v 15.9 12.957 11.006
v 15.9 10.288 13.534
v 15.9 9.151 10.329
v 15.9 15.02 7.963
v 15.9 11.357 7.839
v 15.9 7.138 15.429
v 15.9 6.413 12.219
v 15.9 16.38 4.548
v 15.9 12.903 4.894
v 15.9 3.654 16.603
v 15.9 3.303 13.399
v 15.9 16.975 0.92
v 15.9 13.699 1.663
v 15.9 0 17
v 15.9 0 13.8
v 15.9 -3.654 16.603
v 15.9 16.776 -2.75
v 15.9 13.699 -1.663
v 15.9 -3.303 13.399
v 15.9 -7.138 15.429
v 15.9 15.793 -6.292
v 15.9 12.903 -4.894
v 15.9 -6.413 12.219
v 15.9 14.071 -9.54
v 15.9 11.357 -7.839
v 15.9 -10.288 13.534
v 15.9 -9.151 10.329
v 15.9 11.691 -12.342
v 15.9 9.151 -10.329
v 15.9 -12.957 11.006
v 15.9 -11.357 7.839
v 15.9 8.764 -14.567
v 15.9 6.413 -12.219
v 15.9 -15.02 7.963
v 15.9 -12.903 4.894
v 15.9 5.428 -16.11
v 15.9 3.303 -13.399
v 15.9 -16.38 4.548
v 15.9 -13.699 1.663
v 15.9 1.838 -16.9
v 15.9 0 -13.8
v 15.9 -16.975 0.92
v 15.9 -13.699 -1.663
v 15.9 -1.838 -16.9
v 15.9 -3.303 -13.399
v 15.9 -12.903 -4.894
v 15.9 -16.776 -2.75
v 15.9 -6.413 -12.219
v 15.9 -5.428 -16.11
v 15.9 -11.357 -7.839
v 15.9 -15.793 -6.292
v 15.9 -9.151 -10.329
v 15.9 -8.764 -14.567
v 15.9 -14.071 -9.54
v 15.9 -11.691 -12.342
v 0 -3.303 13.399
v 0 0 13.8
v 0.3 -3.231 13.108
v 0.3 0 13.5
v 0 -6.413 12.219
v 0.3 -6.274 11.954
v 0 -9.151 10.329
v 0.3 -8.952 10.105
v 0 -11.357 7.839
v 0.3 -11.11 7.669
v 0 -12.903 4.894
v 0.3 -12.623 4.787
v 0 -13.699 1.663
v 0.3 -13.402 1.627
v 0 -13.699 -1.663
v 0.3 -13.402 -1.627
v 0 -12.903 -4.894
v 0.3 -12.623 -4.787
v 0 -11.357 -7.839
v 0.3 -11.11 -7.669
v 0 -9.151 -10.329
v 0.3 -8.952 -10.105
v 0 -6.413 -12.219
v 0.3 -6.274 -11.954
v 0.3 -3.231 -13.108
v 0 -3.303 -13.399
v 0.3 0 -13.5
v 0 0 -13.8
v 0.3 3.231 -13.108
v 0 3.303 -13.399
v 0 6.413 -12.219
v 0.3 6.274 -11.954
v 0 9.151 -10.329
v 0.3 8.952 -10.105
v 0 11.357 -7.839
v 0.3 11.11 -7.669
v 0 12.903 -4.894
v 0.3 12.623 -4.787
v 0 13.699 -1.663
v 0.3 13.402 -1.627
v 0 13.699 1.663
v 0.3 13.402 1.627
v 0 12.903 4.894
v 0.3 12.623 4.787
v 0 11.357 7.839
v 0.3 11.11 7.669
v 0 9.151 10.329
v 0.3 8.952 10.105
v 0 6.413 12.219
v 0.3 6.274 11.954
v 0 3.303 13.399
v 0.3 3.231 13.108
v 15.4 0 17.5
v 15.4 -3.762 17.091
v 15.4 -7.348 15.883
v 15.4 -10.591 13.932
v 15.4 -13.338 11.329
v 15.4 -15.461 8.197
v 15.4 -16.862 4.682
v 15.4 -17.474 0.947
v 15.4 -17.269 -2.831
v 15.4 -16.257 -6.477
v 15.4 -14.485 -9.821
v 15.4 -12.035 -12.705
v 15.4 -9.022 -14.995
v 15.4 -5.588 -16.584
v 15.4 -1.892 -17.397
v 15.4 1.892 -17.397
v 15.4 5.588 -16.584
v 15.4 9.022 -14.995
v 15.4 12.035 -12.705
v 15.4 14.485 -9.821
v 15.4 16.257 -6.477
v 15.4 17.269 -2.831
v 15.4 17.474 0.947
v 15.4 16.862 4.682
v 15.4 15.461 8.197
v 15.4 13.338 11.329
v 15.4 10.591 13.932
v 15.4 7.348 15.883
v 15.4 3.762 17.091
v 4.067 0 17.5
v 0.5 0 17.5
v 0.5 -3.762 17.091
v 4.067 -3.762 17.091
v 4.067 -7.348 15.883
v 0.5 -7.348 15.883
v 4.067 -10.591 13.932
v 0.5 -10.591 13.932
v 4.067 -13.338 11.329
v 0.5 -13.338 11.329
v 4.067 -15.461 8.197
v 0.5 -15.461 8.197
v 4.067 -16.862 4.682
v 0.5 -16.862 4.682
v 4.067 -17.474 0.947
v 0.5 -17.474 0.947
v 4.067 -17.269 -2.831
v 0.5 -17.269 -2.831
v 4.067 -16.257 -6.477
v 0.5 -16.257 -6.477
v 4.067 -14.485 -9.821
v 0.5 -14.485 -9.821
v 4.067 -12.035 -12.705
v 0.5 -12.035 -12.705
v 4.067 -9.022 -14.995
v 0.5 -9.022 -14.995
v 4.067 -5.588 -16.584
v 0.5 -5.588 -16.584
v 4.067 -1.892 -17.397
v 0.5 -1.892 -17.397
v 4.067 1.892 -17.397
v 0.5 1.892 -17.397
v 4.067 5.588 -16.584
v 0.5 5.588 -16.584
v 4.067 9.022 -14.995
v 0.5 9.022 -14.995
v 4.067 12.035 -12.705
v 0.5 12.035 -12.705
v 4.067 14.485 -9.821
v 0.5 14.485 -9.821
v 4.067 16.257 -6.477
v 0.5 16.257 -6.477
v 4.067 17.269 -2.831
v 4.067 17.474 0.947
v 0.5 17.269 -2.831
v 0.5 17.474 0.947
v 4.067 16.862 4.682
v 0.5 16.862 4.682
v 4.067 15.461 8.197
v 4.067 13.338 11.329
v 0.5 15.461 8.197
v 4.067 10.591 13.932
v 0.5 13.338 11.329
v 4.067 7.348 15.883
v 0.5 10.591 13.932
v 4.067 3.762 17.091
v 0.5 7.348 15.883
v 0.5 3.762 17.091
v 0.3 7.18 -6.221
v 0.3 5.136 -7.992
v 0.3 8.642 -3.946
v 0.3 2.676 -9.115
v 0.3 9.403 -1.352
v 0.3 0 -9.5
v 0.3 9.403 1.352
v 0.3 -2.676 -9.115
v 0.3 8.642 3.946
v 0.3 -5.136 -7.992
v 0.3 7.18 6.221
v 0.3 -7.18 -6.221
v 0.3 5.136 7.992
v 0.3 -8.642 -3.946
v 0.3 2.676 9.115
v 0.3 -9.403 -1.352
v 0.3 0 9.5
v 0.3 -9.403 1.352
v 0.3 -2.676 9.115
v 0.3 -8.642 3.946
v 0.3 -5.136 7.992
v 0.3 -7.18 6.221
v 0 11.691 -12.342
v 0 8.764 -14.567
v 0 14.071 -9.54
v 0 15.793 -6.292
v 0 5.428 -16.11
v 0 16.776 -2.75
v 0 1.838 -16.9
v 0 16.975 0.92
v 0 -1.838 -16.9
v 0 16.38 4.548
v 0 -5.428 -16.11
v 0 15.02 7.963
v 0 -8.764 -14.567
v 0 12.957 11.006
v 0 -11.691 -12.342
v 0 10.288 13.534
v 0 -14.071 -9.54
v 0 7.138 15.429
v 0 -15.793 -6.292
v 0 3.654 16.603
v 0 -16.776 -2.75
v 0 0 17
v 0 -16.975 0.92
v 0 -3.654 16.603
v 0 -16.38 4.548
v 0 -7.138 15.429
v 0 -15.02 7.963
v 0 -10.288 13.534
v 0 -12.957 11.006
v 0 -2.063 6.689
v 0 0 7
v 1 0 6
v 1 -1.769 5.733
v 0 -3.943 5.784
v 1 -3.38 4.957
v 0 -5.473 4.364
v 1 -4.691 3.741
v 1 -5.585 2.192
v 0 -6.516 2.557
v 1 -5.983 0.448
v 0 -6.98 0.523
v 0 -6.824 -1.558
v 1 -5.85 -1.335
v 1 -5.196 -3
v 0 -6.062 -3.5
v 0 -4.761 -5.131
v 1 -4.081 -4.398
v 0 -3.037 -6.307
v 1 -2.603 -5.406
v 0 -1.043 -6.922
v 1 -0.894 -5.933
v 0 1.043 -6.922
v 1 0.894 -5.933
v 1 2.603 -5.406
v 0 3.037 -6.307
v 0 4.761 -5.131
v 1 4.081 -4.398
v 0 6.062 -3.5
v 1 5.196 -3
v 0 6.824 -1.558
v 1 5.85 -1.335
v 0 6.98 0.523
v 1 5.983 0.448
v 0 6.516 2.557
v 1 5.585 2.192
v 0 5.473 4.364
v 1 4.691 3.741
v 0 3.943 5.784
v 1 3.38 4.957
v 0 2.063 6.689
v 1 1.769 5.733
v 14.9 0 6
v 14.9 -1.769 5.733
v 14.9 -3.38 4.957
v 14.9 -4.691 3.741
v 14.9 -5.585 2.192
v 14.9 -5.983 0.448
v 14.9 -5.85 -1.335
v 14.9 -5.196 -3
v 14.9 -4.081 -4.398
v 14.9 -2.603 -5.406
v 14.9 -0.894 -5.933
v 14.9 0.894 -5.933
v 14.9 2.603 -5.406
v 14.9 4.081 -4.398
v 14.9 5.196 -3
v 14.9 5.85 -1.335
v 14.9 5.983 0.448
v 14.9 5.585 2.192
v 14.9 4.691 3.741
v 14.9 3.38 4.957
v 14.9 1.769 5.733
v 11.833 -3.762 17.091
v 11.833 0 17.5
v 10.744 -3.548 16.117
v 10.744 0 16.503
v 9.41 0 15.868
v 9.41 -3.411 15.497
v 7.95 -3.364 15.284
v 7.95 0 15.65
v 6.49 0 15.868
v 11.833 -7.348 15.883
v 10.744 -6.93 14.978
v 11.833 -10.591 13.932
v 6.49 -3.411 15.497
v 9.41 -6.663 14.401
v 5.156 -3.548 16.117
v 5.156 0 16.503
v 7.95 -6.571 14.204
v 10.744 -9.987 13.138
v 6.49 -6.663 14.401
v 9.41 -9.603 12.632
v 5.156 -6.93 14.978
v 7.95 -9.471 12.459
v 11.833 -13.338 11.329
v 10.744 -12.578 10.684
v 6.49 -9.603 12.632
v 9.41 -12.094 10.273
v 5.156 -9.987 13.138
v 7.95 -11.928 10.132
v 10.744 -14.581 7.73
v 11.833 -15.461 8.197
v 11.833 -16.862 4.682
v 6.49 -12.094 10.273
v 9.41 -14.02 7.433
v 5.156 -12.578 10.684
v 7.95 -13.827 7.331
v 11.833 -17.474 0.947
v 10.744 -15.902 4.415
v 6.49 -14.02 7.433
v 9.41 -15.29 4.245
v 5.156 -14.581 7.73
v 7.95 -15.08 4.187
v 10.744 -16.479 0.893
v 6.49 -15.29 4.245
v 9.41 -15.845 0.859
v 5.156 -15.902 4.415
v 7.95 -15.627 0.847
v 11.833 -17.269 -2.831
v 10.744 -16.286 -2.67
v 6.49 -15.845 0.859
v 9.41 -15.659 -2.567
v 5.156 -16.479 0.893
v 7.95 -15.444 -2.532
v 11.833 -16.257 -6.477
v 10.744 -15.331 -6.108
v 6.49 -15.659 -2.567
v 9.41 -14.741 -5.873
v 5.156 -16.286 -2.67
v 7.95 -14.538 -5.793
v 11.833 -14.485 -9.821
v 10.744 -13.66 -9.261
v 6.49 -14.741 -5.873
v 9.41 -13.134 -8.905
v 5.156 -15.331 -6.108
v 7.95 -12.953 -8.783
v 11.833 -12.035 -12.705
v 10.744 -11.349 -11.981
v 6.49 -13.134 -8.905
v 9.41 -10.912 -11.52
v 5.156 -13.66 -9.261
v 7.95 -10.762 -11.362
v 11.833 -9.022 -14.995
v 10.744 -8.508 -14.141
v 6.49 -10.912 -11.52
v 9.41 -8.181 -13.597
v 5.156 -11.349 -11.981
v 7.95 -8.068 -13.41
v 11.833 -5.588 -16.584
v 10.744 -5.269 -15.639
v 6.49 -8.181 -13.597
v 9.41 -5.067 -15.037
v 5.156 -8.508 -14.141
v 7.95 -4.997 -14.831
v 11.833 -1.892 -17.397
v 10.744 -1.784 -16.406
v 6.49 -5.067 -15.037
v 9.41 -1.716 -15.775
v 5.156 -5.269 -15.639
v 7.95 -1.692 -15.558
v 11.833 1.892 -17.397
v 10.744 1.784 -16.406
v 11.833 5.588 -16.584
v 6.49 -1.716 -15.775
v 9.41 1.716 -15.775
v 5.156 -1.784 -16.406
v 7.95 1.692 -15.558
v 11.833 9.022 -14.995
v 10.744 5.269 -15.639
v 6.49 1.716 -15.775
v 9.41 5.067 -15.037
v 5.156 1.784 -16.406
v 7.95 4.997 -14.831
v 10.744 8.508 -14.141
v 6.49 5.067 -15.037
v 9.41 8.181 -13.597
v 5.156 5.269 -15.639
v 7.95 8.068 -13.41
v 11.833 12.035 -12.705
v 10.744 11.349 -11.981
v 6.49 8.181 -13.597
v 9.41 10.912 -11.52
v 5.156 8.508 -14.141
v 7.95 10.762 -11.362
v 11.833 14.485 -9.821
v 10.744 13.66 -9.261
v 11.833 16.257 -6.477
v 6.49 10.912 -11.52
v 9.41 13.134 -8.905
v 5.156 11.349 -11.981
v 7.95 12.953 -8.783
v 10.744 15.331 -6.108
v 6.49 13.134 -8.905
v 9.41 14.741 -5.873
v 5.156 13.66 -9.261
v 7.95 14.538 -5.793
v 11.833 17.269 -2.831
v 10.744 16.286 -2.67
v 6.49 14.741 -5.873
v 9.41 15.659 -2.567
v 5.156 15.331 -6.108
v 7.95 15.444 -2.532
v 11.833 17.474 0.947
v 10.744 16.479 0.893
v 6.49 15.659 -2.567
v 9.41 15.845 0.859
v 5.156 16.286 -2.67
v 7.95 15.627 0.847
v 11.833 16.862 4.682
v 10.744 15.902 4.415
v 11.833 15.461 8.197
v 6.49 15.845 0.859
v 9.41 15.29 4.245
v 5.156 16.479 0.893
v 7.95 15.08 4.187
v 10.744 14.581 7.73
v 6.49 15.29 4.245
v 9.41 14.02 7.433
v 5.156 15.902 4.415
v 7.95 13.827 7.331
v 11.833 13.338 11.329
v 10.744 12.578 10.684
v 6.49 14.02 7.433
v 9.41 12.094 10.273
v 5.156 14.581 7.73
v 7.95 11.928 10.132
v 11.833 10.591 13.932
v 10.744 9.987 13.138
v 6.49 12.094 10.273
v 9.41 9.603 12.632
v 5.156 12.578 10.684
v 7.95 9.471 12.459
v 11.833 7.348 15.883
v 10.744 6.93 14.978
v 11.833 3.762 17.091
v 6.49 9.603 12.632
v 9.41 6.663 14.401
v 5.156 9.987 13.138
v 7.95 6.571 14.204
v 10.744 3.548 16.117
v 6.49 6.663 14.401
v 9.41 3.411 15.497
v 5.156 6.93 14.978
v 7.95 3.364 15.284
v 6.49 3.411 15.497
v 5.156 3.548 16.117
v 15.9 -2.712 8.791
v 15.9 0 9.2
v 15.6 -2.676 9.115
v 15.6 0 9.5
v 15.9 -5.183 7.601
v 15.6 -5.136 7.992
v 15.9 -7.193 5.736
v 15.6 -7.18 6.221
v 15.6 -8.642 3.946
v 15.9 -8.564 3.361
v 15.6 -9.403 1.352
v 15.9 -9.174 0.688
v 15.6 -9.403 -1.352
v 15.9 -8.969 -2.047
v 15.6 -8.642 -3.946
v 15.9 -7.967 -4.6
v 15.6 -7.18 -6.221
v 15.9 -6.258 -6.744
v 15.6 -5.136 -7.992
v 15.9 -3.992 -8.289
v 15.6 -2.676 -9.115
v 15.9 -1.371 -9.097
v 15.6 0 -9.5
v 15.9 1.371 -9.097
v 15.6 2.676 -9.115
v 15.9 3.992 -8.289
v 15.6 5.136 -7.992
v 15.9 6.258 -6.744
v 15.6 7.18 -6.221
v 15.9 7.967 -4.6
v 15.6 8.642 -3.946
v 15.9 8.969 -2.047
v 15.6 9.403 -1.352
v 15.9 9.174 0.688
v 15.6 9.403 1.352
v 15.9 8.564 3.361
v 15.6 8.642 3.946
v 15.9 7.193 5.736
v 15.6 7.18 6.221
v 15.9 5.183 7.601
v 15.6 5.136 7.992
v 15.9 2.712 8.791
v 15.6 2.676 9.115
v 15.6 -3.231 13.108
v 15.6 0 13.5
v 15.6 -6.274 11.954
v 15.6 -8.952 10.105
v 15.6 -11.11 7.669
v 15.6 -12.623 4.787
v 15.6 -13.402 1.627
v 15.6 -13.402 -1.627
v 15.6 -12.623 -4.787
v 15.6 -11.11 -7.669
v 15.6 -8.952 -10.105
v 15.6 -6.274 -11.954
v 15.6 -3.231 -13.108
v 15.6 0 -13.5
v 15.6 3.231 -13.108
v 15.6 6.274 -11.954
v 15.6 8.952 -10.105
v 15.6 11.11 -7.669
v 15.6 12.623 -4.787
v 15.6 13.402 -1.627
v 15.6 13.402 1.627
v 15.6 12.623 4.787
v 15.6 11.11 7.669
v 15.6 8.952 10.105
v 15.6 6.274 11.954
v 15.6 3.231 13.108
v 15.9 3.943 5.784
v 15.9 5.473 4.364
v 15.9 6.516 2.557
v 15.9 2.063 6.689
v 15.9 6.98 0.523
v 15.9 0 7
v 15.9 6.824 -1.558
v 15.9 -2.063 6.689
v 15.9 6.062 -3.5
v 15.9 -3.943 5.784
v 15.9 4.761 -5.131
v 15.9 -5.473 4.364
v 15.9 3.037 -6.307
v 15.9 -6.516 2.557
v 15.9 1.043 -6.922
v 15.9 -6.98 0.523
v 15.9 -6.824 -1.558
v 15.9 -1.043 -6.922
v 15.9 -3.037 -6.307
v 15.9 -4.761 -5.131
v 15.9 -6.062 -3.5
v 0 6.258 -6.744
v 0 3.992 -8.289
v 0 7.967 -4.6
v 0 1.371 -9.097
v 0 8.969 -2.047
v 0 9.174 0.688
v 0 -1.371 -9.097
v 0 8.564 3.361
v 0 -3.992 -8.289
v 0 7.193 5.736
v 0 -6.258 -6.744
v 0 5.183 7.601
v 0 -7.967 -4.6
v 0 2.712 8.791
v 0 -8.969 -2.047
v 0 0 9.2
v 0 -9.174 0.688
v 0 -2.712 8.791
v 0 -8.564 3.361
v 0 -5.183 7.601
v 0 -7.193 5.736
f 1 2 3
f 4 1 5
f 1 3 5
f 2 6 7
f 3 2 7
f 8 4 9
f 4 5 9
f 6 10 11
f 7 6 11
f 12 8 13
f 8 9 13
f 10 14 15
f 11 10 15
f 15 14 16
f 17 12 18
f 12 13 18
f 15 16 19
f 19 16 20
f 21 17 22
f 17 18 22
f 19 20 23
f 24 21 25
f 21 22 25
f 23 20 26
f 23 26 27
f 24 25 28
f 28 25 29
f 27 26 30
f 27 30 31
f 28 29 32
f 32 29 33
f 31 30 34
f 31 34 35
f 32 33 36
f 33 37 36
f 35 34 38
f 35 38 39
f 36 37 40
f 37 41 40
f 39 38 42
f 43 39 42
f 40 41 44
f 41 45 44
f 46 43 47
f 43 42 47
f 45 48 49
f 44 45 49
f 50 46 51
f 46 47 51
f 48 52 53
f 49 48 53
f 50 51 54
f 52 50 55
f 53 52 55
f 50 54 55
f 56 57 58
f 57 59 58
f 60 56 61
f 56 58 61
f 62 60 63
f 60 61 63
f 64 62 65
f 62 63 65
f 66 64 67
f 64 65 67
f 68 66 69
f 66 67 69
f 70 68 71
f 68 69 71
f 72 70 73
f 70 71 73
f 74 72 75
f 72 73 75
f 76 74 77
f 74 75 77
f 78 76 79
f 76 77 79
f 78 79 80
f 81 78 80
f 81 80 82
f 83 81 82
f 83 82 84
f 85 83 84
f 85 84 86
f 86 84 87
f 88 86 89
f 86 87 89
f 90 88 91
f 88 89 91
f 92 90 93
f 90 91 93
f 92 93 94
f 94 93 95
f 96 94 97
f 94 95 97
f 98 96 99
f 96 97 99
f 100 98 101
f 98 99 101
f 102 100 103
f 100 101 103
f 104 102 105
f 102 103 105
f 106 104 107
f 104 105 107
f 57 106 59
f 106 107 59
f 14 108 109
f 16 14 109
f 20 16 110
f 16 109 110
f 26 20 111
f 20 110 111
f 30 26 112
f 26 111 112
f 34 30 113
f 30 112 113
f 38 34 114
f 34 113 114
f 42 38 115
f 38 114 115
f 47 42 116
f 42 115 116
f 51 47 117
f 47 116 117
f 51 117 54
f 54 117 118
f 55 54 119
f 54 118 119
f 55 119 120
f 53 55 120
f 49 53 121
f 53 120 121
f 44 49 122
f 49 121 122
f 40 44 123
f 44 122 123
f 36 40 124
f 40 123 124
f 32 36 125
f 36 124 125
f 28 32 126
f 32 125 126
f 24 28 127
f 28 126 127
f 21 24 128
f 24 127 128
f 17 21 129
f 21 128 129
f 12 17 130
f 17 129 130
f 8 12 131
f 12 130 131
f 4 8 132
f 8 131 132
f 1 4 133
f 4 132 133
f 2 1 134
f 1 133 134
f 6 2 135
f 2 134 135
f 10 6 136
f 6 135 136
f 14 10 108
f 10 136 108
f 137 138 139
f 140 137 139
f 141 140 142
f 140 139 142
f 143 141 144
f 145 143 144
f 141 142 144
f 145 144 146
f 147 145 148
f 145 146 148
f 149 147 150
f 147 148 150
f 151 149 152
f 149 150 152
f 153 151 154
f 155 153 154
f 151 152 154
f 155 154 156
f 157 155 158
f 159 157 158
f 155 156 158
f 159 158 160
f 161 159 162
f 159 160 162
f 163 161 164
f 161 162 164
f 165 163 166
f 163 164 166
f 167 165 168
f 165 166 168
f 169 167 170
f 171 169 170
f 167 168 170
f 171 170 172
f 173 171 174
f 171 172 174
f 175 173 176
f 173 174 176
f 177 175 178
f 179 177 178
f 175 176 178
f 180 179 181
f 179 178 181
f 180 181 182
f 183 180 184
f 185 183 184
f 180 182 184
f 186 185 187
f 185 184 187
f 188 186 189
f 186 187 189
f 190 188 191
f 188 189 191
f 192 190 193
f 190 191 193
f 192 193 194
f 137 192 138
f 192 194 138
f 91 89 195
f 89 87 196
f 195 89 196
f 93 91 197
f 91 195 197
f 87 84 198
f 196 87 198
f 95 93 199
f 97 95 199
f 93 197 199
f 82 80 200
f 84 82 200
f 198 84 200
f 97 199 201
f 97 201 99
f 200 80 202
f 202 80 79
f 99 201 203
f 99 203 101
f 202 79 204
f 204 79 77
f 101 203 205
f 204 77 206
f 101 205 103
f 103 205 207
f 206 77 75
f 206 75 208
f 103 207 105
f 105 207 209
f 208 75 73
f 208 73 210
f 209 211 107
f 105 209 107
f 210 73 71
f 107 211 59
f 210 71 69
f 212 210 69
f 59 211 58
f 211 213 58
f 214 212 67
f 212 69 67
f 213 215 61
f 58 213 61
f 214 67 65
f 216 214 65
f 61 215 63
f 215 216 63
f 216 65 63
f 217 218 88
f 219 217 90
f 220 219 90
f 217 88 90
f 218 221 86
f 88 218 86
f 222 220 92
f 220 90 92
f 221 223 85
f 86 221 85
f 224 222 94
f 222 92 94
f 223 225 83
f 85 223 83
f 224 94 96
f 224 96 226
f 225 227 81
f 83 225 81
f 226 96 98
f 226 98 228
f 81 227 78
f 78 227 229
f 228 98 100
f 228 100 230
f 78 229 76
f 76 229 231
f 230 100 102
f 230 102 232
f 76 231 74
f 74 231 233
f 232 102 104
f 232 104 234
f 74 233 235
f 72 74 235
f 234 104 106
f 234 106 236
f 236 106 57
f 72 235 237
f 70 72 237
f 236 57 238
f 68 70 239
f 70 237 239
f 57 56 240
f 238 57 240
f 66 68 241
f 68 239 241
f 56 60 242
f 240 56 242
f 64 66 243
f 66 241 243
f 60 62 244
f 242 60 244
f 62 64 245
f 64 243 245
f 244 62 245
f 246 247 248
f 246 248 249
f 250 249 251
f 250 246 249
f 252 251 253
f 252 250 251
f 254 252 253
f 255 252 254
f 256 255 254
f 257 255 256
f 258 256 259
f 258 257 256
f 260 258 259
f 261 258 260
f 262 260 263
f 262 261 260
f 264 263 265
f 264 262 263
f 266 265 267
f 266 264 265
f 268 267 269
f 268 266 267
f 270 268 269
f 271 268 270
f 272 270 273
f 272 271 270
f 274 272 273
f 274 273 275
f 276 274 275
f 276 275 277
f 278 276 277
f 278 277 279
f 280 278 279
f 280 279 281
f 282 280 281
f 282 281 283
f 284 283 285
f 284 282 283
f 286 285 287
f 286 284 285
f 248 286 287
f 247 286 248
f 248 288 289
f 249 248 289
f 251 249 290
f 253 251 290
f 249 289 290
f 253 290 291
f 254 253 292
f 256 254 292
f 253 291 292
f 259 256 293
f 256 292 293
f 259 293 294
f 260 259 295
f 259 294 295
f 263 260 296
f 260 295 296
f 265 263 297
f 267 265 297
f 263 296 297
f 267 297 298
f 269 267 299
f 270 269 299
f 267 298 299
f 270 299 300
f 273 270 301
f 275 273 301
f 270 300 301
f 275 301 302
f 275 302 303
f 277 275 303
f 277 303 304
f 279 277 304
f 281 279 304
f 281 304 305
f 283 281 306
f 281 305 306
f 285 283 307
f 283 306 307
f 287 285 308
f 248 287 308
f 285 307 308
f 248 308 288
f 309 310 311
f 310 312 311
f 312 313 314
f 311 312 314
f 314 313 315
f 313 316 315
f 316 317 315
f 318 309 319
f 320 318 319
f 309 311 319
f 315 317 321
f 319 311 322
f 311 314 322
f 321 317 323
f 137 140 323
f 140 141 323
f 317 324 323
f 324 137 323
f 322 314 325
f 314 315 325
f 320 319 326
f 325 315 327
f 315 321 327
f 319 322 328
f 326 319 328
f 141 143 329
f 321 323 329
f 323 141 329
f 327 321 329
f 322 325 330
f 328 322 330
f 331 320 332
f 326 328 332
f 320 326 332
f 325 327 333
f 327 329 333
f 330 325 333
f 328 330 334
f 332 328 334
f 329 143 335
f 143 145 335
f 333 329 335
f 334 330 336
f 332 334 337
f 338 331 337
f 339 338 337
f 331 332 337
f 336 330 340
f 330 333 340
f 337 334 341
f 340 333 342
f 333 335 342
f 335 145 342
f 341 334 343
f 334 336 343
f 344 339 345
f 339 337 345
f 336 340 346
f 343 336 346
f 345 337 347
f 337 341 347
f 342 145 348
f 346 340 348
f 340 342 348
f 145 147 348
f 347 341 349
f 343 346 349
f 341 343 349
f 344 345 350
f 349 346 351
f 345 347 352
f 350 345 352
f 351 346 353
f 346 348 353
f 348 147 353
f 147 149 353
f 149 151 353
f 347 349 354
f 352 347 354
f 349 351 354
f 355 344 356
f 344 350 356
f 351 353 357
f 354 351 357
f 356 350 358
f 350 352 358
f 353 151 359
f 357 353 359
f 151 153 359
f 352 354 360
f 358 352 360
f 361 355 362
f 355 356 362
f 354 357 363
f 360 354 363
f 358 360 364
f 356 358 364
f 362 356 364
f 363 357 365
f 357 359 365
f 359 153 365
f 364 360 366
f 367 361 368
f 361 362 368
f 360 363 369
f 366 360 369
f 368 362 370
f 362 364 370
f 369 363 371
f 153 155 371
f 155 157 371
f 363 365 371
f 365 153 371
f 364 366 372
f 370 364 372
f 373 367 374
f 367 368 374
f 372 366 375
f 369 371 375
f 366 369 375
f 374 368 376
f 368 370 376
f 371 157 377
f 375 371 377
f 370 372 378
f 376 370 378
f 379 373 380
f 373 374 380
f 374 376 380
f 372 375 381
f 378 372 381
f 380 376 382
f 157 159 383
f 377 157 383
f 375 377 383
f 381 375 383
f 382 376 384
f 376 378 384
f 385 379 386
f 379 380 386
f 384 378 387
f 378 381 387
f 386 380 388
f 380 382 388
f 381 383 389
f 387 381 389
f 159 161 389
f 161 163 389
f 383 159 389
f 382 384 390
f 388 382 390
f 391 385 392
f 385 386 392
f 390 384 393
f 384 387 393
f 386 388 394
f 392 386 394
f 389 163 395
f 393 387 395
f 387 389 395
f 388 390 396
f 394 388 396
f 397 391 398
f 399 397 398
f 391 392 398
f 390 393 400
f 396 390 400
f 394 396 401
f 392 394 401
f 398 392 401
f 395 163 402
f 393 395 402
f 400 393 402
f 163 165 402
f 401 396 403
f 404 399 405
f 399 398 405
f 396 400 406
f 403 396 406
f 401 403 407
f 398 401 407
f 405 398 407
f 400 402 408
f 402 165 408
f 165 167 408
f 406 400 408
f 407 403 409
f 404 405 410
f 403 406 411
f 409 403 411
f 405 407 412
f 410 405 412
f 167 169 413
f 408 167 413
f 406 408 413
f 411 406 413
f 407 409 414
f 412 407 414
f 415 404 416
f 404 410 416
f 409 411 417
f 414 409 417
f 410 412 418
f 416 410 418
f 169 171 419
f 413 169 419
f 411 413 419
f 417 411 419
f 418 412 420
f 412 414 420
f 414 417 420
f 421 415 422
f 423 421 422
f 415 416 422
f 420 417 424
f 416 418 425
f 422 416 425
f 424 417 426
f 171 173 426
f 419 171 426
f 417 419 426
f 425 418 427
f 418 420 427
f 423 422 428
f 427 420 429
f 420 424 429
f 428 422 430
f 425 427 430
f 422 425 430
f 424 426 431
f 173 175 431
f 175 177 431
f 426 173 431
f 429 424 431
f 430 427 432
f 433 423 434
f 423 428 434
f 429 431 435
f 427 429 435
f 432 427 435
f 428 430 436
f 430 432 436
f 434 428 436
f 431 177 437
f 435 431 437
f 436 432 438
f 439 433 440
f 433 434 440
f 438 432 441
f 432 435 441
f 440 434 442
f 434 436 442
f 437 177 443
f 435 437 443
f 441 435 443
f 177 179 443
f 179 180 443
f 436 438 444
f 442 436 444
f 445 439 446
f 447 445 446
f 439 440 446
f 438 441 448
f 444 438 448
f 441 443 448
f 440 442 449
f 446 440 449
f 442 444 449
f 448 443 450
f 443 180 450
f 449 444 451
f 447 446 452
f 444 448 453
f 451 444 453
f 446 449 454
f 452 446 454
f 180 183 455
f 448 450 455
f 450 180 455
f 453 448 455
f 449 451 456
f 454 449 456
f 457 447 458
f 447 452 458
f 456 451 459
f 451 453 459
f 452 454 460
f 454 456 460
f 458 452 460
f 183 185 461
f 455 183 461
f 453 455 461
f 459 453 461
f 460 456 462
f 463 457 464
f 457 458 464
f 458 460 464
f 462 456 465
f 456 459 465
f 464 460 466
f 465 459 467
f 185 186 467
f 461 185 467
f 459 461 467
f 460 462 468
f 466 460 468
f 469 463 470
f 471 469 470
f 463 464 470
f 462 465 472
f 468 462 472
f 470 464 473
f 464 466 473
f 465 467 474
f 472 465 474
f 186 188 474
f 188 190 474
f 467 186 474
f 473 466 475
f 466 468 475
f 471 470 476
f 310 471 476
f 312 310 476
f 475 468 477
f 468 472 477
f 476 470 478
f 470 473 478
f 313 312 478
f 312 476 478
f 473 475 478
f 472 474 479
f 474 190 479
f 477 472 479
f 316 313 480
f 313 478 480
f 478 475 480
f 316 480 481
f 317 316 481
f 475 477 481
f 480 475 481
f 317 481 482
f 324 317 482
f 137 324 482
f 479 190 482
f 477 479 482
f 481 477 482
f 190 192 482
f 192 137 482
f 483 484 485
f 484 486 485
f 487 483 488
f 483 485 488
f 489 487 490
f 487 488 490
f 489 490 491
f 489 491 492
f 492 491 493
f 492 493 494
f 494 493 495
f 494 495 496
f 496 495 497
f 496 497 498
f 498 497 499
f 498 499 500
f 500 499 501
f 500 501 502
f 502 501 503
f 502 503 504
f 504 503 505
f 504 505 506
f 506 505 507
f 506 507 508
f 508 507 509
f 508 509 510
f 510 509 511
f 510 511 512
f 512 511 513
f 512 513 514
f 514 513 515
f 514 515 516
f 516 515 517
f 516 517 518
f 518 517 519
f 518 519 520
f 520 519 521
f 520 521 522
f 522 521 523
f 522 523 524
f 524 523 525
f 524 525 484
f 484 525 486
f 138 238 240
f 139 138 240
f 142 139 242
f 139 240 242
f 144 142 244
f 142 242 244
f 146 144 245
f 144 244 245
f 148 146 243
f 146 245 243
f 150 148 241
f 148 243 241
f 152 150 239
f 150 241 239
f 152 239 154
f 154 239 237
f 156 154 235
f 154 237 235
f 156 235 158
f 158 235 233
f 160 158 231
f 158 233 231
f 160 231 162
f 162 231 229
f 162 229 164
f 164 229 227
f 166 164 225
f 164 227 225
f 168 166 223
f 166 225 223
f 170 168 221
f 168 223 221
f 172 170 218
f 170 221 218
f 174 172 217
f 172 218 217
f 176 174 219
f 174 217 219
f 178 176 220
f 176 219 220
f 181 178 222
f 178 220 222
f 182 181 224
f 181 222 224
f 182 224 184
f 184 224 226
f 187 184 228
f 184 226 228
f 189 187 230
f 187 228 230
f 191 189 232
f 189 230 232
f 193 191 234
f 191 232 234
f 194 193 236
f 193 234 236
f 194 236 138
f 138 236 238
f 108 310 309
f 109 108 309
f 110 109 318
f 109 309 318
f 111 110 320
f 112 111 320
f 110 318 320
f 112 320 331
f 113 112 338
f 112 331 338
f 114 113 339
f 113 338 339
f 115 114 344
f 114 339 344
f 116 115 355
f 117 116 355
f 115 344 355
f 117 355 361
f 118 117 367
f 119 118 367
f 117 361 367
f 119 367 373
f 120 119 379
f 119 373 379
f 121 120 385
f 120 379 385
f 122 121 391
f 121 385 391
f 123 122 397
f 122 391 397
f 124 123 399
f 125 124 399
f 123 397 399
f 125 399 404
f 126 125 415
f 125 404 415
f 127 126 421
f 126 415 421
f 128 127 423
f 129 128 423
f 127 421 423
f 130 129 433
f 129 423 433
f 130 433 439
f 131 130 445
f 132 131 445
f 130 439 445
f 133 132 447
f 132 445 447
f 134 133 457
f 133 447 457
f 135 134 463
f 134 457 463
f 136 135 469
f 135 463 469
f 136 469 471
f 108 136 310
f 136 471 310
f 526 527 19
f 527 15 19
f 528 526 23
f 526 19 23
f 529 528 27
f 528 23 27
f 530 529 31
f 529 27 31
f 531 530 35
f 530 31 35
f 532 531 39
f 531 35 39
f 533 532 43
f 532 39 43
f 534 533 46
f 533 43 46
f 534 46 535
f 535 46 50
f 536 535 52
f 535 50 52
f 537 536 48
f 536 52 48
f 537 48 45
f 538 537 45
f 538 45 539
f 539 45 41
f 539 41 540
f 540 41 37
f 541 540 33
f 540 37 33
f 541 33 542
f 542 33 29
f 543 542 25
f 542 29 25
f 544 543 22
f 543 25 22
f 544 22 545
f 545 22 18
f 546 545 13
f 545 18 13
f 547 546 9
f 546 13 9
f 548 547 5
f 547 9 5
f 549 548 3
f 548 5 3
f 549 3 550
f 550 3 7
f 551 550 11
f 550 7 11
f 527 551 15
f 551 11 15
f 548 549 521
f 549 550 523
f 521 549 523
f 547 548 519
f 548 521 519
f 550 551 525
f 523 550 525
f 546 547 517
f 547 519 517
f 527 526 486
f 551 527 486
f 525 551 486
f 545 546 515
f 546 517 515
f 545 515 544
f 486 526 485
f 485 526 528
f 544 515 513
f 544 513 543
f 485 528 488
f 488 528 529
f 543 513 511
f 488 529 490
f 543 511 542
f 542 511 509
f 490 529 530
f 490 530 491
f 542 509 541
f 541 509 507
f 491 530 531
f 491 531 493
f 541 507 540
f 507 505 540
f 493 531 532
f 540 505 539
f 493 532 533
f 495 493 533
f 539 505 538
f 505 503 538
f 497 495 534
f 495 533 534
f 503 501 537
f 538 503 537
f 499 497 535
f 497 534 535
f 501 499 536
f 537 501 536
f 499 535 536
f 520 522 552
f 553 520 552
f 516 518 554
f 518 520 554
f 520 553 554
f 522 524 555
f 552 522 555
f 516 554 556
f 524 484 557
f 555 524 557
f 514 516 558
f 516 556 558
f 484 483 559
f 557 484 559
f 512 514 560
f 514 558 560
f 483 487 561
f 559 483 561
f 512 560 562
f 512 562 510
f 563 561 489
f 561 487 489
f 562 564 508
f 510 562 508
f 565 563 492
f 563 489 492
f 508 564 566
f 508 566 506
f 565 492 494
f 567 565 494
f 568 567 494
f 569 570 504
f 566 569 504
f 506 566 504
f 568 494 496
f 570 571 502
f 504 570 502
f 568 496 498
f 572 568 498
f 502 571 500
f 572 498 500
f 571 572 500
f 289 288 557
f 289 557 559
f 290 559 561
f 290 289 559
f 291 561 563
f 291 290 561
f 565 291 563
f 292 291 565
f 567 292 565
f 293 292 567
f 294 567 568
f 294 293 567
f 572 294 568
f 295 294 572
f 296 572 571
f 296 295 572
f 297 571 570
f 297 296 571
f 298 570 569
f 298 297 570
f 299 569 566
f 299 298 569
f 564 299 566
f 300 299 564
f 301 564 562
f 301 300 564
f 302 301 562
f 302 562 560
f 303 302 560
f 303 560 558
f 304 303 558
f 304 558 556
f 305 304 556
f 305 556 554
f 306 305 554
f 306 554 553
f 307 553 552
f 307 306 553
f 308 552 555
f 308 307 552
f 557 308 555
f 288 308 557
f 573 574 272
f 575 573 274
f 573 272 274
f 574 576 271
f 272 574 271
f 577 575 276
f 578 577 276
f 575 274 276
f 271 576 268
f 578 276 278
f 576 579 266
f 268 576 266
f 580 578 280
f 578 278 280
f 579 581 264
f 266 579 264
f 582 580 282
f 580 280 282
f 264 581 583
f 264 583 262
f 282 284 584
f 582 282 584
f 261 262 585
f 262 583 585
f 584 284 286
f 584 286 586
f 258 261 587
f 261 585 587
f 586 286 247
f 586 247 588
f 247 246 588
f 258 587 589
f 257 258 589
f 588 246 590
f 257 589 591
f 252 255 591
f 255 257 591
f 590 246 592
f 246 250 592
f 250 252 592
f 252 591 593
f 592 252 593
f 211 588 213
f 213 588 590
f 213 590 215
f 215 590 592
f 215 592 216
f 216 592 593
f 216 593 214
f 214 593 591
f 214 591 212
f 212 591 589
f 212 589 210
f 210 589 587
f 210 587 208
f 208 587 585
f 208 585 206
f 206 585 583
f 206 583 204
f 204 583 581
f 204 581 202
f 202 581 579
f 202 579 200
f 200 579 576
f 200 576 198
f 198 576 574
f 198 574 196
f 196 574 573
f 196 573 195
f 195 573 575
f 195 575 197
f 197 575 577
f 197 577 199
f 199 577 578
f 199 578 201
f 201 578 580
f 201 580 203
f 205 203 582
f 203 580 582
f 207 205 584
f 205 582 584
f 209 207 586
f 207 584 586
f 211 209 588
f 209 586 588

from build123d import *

# Parameters (mm, degrees)
F2_SIZE = 0.5
F3_SIZE = 1


with BuildPart() as f1:
    # F0 (on Front) → F1 (revolve)
    with BuildSketch(Plane.XZ):
        with BuildLine():
            Line((0, 9.2), (0, 6))
            Line((0, 6), (15.9, 6))
            Line((15.9, 6), (15.9, 9.2))
            Line((15.9, 9.2), (15.6, 9.5))
            Line((15.6, 9.5), (15.6, 13.5))
            Line((15.6, 13.5), (15.9, 13.8))
            Line((15.9, 13.8), (15.9, 17.5))
            Line((15.9, 17.5), (11.832976, 17.5))
            ThreePointArc((11.832976, 17.5), (7.95, 15.65), (4.067024, 17.5))
            Line((4.067024, 17.5), (0, 17.5))
            Line((0, 17.5), (0, 13.8))
            Line((0, 13.8), (0.3, 13.5))
            Line((0.3, 13.5), (0.3, 9.5))
            Line((0.3, 9.5), (0, 9.2))
        make_face()
    revolve(axis=Axis((29.48505, 0, 0), (1, 0, 0)))

    # F2
    f2_edges = [f1.edges().sort_by_distance(p)[0] for p in [
        (0, 0, -17.5),
        (15.9, 0, -17.5),
    ]]
    chamfer(f2_edges, length=F2_SIZE)

    # F3
    f3_edges = [f1.edges().sort_by_distance(p)[0] for p in [
        (15.9, 0, -6),
        (0, 0, -6),
    ]]
    chamfer(f3_edges, length=F3_SIZE)


solid = f1.part
